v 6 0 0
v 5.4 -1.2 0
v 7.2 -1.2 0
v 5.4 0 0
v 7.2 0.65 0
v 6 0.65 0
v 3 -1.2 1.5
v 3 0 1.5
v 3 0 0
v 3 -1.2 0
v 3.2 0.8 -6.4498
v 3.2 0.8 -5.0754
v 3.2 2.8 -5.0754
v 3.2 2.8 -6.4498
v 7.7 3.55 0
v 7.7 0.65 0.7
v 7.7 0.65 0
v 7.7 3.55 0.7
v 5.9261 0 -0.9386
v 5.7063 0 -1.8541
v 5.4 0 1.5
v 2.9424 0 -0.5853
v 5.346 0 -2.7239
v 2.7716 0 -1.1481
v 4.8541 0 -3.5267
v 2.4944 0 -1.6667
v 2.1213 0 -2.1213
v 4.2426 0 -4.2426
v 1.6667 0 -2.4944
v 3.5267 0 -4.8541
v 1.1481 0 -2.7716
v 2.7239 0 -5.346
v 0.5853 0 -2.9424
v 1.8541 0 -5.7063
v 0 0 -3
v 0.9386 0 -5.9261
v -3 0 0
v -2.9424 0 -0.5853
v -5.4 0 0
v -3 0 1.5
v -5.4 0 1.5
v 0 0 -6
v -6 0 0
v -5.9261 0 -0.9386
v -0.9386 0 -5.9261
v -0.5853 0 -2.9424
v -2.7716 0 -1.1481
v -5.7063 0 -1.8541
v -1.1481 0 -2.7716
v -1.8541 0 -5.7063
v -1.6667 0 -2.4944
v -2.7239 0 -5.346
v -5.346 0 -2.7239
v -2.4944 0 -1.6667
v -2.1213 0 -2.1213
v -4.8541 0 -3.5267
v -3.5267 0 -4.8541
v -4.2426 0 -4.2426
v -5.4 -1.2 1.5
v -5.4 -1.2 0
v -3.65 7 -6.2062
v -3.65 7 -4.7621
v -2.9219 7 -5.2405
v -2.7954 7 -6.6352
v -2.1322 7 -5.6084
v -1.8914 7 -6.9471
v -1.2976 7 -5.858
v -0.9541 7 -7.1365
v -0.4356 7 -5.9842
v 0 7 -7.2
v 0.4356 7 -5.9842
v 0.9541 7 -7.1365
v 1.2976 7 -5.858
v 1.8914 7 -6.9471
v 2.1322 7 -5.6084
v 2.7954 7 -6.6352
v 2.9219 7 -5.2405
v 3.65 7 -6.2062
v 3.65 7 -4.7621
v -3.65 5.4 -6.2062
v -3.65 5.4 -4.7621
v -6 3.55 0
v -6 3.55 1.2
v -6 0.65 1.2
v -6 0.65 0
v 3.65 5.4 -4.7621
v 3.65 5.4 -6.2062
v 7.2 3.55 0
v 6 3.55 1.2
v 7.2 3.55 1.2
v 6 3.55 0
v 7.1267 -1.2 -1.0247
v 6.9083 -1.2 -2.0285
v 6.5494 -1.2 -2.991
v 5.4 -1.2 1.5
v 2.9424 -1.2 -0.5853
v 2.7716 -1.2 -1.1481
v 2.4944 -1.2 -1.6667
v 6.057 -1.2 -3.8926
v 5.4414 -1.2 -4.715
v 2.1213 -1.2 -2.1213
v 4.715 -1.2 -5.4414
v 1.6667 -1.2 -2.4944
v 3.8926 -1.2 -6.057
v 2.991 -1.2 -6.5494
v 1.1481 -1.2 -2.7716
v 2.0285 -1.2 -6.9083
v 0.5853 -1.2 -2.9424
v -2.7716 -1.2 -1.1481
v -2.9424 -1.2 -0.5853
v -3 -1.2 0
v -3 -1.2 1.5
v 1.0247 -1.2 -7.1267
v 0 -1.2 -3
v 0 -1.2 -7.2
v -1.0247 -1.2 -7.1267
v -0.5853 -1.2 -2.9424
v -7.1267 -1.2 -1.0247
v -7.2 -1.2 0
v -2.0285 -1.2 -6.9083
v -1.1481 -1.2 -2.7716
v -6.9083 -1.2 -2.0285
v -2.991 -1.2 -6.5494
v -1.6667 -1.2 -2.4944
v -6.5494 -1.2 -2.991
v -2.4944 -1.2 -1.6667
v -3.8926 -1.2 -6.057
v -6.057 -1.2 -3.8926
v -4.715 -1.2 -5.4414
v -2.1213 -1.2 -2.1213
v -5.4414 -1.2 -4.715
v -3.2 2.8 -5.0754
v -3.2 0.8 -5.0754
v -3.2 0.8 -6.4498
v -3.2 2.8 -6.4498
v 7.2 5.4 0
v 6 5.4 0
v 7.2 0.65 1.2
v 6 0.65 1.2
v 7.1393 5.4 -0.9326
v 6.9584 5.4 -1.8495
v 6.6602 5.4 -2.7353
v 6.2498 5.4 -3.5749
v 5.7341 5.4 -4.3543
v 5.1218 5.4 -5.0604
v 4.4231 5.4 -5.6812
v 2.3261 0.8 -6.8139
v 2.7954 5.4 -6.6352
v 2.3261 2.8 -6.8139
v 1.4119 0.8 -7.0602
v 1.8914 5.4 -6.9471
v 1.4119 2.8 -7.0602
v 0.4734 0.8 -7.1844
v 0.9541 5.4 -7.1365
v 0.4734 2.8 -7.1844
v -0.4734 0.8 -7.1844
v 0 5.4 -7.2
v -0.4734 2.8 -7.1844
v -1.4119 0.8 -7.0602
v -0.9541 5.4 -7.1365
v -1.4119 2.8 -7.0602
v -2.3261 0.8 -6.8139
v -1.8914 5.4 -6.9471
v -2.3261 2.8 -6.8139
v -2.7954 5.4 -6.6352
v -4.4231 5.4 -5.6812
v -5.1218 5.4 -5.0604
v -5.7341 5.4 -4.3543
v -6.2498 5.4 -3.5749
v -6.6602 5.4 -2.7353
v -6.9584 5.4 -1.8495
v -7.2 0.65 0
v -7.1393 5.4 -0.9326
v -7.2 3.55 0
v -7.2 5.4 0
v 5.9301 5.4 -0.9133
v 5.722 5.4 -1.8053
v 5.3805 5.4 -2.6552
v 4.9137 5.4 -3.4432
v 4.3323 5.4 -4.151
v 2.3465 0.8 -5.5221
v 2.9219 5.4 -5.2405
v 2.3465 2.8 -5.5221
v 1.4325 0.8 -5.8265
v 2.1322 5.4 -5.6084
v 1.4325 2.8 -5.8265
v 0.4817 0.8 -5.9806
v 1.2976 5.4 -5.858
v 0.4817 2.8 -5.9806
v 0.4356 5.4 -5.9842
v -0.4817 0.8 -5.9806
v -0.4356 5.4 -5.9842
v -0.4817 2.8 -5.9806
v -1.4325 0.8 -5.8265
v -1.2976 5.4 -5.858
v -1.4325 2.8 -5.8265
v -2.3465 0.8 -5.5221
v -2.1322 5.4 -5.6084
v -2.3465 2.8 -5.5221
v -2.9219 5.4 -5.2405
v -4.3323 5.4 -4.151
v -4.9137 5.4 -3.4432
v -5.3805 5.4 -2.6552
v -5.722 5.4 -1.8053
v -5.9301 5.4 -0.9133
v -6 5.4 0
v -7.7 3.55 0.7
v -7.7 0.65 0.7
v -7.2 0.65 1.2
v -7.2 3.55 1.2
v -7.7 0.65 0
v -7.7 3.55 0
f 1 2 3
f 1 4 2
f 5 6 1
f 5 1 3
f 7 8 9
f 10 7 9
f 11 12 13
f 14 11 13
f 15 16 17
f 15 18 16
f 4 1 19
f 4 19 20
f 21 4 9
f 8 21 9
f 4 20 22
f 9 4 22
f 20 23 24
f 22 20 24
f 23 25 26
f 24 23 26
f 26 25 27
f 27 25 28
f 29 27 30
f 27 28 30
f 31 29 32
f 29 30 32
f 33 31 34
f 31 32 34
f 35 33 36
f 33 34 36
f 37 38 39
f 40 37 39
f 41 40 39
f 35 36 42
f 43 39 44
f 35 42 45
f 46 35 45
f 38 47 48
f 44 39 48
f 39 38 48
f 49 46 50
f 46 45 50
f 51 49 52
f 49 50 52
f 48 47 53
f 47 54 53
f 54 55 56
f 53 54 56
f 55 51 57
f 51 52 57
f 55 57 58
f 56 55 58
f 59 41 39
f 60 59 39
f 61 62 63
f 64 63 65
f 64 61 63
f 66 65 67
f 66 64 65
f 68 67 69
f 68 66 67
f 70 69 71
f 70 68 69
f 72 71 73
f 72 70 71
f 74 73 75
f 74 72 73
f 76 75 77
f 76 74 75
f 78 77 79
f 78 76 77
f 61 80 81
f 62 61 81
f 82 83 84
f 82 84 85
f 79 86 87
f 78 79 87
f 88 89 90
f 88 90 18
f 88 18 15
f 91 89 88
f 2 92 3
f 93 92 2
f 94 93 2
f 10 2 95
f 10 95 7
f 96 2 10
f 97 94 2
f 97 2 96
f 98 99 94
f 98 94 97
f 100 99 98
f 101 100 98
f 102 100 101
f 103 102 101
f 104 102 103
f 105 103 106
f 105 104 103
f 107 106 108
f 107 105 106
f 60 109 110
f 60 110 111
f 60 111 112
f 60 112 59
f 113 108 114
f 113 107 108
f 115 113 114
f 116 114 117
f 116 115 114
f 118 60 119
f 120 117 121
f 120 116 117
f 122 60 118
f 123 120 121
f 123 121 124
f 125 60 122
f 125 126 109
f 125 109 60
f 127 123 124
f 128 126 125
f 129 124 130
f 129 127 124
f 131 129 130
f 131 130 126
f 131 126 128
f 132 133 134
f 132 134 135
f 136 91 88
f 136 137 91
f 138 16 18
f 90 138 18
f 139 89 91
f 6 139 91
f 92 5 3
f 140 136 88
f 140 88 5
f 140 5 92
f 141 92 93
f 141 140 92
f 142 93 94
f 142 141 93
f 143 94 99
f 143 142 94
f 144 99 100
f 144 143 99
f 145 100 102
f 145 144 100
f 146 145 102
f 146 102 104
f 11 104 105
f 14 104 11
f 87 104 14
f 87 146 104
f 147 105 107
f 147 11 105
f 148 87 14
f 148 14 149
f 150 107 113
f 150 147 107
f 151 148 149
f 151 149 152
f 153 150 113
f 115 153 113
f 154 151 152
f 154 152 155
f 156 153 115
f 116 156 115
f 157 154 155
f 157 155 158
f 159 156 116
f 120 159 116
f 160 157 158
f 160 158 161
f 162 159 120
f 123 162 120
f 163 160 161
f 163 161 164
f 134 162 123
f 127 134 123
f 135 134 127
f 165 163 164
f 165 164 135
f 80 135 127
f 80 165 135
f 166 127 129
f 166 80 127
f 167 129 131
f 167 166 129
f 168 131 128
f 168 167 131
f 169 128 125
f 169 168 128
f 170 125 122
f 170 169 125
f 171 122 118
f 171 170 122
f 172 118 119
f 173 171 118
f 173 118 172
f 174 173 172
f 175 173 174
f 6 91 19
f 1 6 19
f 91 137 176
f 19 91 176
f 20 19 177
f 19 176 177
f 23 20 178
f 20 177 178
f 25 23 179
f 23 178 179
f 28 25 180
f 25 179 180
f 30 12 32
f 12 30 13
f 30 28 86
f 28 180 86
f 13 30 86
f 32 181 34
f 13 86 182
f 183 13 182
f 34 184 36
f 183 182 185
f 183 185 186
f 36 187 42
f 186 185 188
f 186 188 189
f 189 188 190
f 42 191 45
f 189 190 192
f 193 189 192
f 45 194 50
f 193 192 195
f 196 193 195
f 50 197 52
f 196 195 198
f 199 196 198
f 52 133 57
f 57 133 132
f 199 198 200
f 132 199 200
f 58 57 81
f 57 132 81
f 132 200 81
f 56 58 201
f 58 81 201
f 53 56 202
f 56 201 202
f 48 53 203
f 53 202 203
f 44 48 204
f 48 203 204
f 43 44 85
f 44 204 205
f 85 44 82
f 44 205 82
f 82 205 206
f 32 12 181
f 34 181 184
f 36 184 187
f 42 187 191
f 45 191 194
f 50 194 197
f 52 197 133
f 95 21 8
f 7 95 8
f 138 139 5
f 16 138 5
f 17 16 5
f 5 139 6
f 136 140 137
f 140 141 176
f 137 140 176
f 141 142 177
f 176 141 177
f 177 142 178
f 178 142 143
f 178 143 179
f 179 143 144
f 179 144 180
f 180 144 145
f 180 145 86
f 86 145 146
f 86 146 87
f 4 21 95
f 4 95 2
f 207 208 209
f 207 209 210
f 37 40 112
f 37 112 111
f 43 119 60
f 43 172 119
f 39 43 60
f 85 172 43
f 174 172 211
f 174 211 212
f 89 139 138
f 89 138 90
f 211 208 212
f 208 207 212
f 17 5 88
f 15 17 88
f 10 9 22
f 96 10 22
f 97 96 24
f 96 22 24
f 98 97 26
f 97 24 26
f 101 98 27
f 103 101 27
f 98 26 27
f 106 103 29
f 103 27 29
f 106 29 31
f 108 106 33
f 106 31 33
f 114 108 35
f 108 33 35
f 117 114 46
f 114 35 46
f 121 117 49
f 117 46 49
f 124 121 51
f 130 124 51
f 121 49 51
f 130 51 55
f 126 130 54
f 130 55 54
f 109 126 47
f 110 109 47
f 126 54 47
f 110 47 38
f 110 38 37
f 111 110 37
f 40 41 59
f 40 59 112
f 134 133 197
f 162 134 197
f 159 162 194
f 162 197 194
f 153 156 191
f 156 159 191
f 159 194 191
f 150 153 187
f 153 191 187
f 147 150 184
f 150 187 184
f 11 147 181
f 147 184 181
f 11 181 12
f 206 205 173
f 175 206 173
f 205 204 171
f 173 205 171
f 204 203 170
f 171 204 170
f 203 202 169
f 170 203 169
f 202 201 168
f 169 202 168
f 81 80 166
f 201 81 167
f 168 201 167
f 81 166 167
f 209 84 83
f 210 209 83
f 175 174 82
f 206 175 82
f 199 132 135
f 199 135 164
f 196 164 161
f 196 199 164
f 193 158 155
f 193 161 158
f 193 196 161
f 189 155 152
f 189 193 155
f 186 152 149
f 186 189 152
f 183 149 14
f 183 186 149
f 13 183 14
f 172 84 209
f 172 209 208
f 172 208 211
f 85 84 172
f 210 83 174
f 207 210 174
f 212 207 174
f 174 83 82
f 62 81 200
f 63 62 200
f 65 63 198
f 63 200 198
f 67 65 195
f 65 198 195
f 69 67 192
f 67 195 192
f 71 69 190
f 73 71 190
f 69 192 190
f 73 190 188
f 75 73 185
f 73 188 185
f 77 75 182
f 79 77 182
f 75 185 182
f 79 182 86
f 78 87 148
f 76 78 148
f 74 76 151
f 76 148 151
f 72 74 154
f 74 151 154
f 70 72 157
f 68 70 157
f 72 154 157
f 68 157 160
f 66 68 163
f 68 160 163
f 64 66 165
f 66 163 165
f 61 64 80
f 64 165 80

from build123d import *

# Parameters (mm, degrees)
SKETCH1_W                = 6
SKETCH1_H                = 1.2
SKETCH1_W_2              = 1.2
SKETCH1_H_2              = 5.4
REVOLVE1_ANGLE           = 180
REVOLVE2_START           = 5.4
REVOLVE2_DEPTH           = 1.6
SKETCH4_W                = 6.4
SKETCH4_H                = 2
CUT_EXTRUDE1_DEPTH       = 10
SKETCH5_R                = 3
CUT_EXTRUDE2_DEPTH       = 10
SKETCH6_W                = 2.4
SKETCH6_H                = 1.5
BOSS_EXTRUDE1_DEPTH      = 1.2
SKETCH7_W                = 1.2
SKETCH7_H                = 2.9
BOSS_EXTRUDE2_DEPTH      = 1.7
CHAMFER1_SIZE            = 0.5
CHAMFER1_OF_MIRROR1_SIZE = 0.5


# Read off the part's stored shape, not the designer's step: Revolve2
with BuildPart() as part:
    # Sketch1 → Revolve1 (revolve)
    with BuildSketch(Plane.XY):
        with Locations((3, -0.6)):
            Rectangle(SKETCH1_W, SKETCH1_H)
        with Locations((6.6, -0.6)):
            Rectangle(SKETCH1_W_2, SKETCH1_H)
        with Locations((6.6, 2.7)):
            Rectangle(SKETCH1_W_2, SKETCH1_H_2)
    revolve(axis=Axis((0, -1.2, 0), (0, 1, 0)), revolution_arc=REVOLVE1_ANGLE)

    # Revolve2 outline → Revolve2 (add)
    with BuildSketch(Plane(origin=(0, 0, 0), x_dir=(1, 0, 0), z_dir=(0, 1, 0)).offset(REVOLVE2_START)):
        with BuildLine():
            ThreePointArc((3.65, 6.206246853), (0, 7.2), (-3.65, 6.206246853))
            Line((-3.65, 6.206246853), (-3.65, 4.762089877))
            ThreePointArc((-3.65, 4.762089877), (0, 6), (3.65, 4.762089877))
            Line((3.65, 4.762089877), (3.65, 6.206246853))
        make_face()
    extrude(amount=REVOLVE2_DEPTH)

    # Sketch4 → Cut-Extrude1 (cut)
    with BuildSketch(Plane.XY):
        with Locations((0, 1.8)):
            Rectangle(SKETCH4_W, SKETCH4_H)
    extrude(amount=-CUT_EXTRUDE1_DEPTH, mode=Mode.SUBTRACT)

    # Sketch5 → Cut-Extrude2 (cut)
    with BuildSketch(Plane(origin=(0, 0, 0), x_dir=(1, 0, 0), z_dir=(0, 1, 0))):
        Circle(SKETCH5_R)
    extrude(amount=-CUT_EXTRUDE2_DEPTH, mode=Mode.SUBTRACT)

    # Sketch6 → Boss-Extrude1 (add)
    with BuildSketch(Plane(origin=(0, 0, 0), x_dir=(1, 0, 0), z_dir=(0, 1, 0))):
        with Locations((-4.2, -0.75)):
            Rectangle(SKETCH6_W, SKETCH6_H)
    boss_extrude1 = extrude(amount=-BOSS_EXTRUDE1_DEPTH)

    # Sketch7 → Boss-Extrude2 (add)
    with BuildSketch(Plane(origin=(-6, 0, 0), x_dir=(0, 0, -1), z_dir=(1, 0, 0))):
        with Locations((-0.6, 2.1)):
            Rectangle(SKETCH7_W, SKETCH7_H)
    boss_extrude2 = extrude(amount=-BOSS_EXTRUDE2_DEPTH)

    # Chamfer1
    chamfer1_edges = [part.edges().sort_by_distance(p)[0] for p in [
        (-7.7, 2.1, 1.2),
    ]]
    chamfer(chamfer1_edges, length=CHAMFER1_SIZE)

    # Mirror1: Boss-Extrude1, Boss-Extrude2 across plane
    add(boss_extrude1.mirror(Plane(origin=(0, 0, 0), x_dir=(0, 0, 1), z_dir=(1, 0, 0))))
    add(boss_extrude2.mirror(Plane(origin=(0, 0, 0), x_dir=(0, 0, 1), z_dir=(1, 0, 0))))

    # Chamfer1 of Mirror1
    chamfer1_of_mirror1_edges = [part.edges().sort_by_distance(p)[0] for p in [
        (7.7, 2.1, 1.2),
    ]]
    chamfer(chamfer1_of_mirror1_edges, length=CHAMFER1_OF_MIRROR1_SIZE)


solid = part.part
